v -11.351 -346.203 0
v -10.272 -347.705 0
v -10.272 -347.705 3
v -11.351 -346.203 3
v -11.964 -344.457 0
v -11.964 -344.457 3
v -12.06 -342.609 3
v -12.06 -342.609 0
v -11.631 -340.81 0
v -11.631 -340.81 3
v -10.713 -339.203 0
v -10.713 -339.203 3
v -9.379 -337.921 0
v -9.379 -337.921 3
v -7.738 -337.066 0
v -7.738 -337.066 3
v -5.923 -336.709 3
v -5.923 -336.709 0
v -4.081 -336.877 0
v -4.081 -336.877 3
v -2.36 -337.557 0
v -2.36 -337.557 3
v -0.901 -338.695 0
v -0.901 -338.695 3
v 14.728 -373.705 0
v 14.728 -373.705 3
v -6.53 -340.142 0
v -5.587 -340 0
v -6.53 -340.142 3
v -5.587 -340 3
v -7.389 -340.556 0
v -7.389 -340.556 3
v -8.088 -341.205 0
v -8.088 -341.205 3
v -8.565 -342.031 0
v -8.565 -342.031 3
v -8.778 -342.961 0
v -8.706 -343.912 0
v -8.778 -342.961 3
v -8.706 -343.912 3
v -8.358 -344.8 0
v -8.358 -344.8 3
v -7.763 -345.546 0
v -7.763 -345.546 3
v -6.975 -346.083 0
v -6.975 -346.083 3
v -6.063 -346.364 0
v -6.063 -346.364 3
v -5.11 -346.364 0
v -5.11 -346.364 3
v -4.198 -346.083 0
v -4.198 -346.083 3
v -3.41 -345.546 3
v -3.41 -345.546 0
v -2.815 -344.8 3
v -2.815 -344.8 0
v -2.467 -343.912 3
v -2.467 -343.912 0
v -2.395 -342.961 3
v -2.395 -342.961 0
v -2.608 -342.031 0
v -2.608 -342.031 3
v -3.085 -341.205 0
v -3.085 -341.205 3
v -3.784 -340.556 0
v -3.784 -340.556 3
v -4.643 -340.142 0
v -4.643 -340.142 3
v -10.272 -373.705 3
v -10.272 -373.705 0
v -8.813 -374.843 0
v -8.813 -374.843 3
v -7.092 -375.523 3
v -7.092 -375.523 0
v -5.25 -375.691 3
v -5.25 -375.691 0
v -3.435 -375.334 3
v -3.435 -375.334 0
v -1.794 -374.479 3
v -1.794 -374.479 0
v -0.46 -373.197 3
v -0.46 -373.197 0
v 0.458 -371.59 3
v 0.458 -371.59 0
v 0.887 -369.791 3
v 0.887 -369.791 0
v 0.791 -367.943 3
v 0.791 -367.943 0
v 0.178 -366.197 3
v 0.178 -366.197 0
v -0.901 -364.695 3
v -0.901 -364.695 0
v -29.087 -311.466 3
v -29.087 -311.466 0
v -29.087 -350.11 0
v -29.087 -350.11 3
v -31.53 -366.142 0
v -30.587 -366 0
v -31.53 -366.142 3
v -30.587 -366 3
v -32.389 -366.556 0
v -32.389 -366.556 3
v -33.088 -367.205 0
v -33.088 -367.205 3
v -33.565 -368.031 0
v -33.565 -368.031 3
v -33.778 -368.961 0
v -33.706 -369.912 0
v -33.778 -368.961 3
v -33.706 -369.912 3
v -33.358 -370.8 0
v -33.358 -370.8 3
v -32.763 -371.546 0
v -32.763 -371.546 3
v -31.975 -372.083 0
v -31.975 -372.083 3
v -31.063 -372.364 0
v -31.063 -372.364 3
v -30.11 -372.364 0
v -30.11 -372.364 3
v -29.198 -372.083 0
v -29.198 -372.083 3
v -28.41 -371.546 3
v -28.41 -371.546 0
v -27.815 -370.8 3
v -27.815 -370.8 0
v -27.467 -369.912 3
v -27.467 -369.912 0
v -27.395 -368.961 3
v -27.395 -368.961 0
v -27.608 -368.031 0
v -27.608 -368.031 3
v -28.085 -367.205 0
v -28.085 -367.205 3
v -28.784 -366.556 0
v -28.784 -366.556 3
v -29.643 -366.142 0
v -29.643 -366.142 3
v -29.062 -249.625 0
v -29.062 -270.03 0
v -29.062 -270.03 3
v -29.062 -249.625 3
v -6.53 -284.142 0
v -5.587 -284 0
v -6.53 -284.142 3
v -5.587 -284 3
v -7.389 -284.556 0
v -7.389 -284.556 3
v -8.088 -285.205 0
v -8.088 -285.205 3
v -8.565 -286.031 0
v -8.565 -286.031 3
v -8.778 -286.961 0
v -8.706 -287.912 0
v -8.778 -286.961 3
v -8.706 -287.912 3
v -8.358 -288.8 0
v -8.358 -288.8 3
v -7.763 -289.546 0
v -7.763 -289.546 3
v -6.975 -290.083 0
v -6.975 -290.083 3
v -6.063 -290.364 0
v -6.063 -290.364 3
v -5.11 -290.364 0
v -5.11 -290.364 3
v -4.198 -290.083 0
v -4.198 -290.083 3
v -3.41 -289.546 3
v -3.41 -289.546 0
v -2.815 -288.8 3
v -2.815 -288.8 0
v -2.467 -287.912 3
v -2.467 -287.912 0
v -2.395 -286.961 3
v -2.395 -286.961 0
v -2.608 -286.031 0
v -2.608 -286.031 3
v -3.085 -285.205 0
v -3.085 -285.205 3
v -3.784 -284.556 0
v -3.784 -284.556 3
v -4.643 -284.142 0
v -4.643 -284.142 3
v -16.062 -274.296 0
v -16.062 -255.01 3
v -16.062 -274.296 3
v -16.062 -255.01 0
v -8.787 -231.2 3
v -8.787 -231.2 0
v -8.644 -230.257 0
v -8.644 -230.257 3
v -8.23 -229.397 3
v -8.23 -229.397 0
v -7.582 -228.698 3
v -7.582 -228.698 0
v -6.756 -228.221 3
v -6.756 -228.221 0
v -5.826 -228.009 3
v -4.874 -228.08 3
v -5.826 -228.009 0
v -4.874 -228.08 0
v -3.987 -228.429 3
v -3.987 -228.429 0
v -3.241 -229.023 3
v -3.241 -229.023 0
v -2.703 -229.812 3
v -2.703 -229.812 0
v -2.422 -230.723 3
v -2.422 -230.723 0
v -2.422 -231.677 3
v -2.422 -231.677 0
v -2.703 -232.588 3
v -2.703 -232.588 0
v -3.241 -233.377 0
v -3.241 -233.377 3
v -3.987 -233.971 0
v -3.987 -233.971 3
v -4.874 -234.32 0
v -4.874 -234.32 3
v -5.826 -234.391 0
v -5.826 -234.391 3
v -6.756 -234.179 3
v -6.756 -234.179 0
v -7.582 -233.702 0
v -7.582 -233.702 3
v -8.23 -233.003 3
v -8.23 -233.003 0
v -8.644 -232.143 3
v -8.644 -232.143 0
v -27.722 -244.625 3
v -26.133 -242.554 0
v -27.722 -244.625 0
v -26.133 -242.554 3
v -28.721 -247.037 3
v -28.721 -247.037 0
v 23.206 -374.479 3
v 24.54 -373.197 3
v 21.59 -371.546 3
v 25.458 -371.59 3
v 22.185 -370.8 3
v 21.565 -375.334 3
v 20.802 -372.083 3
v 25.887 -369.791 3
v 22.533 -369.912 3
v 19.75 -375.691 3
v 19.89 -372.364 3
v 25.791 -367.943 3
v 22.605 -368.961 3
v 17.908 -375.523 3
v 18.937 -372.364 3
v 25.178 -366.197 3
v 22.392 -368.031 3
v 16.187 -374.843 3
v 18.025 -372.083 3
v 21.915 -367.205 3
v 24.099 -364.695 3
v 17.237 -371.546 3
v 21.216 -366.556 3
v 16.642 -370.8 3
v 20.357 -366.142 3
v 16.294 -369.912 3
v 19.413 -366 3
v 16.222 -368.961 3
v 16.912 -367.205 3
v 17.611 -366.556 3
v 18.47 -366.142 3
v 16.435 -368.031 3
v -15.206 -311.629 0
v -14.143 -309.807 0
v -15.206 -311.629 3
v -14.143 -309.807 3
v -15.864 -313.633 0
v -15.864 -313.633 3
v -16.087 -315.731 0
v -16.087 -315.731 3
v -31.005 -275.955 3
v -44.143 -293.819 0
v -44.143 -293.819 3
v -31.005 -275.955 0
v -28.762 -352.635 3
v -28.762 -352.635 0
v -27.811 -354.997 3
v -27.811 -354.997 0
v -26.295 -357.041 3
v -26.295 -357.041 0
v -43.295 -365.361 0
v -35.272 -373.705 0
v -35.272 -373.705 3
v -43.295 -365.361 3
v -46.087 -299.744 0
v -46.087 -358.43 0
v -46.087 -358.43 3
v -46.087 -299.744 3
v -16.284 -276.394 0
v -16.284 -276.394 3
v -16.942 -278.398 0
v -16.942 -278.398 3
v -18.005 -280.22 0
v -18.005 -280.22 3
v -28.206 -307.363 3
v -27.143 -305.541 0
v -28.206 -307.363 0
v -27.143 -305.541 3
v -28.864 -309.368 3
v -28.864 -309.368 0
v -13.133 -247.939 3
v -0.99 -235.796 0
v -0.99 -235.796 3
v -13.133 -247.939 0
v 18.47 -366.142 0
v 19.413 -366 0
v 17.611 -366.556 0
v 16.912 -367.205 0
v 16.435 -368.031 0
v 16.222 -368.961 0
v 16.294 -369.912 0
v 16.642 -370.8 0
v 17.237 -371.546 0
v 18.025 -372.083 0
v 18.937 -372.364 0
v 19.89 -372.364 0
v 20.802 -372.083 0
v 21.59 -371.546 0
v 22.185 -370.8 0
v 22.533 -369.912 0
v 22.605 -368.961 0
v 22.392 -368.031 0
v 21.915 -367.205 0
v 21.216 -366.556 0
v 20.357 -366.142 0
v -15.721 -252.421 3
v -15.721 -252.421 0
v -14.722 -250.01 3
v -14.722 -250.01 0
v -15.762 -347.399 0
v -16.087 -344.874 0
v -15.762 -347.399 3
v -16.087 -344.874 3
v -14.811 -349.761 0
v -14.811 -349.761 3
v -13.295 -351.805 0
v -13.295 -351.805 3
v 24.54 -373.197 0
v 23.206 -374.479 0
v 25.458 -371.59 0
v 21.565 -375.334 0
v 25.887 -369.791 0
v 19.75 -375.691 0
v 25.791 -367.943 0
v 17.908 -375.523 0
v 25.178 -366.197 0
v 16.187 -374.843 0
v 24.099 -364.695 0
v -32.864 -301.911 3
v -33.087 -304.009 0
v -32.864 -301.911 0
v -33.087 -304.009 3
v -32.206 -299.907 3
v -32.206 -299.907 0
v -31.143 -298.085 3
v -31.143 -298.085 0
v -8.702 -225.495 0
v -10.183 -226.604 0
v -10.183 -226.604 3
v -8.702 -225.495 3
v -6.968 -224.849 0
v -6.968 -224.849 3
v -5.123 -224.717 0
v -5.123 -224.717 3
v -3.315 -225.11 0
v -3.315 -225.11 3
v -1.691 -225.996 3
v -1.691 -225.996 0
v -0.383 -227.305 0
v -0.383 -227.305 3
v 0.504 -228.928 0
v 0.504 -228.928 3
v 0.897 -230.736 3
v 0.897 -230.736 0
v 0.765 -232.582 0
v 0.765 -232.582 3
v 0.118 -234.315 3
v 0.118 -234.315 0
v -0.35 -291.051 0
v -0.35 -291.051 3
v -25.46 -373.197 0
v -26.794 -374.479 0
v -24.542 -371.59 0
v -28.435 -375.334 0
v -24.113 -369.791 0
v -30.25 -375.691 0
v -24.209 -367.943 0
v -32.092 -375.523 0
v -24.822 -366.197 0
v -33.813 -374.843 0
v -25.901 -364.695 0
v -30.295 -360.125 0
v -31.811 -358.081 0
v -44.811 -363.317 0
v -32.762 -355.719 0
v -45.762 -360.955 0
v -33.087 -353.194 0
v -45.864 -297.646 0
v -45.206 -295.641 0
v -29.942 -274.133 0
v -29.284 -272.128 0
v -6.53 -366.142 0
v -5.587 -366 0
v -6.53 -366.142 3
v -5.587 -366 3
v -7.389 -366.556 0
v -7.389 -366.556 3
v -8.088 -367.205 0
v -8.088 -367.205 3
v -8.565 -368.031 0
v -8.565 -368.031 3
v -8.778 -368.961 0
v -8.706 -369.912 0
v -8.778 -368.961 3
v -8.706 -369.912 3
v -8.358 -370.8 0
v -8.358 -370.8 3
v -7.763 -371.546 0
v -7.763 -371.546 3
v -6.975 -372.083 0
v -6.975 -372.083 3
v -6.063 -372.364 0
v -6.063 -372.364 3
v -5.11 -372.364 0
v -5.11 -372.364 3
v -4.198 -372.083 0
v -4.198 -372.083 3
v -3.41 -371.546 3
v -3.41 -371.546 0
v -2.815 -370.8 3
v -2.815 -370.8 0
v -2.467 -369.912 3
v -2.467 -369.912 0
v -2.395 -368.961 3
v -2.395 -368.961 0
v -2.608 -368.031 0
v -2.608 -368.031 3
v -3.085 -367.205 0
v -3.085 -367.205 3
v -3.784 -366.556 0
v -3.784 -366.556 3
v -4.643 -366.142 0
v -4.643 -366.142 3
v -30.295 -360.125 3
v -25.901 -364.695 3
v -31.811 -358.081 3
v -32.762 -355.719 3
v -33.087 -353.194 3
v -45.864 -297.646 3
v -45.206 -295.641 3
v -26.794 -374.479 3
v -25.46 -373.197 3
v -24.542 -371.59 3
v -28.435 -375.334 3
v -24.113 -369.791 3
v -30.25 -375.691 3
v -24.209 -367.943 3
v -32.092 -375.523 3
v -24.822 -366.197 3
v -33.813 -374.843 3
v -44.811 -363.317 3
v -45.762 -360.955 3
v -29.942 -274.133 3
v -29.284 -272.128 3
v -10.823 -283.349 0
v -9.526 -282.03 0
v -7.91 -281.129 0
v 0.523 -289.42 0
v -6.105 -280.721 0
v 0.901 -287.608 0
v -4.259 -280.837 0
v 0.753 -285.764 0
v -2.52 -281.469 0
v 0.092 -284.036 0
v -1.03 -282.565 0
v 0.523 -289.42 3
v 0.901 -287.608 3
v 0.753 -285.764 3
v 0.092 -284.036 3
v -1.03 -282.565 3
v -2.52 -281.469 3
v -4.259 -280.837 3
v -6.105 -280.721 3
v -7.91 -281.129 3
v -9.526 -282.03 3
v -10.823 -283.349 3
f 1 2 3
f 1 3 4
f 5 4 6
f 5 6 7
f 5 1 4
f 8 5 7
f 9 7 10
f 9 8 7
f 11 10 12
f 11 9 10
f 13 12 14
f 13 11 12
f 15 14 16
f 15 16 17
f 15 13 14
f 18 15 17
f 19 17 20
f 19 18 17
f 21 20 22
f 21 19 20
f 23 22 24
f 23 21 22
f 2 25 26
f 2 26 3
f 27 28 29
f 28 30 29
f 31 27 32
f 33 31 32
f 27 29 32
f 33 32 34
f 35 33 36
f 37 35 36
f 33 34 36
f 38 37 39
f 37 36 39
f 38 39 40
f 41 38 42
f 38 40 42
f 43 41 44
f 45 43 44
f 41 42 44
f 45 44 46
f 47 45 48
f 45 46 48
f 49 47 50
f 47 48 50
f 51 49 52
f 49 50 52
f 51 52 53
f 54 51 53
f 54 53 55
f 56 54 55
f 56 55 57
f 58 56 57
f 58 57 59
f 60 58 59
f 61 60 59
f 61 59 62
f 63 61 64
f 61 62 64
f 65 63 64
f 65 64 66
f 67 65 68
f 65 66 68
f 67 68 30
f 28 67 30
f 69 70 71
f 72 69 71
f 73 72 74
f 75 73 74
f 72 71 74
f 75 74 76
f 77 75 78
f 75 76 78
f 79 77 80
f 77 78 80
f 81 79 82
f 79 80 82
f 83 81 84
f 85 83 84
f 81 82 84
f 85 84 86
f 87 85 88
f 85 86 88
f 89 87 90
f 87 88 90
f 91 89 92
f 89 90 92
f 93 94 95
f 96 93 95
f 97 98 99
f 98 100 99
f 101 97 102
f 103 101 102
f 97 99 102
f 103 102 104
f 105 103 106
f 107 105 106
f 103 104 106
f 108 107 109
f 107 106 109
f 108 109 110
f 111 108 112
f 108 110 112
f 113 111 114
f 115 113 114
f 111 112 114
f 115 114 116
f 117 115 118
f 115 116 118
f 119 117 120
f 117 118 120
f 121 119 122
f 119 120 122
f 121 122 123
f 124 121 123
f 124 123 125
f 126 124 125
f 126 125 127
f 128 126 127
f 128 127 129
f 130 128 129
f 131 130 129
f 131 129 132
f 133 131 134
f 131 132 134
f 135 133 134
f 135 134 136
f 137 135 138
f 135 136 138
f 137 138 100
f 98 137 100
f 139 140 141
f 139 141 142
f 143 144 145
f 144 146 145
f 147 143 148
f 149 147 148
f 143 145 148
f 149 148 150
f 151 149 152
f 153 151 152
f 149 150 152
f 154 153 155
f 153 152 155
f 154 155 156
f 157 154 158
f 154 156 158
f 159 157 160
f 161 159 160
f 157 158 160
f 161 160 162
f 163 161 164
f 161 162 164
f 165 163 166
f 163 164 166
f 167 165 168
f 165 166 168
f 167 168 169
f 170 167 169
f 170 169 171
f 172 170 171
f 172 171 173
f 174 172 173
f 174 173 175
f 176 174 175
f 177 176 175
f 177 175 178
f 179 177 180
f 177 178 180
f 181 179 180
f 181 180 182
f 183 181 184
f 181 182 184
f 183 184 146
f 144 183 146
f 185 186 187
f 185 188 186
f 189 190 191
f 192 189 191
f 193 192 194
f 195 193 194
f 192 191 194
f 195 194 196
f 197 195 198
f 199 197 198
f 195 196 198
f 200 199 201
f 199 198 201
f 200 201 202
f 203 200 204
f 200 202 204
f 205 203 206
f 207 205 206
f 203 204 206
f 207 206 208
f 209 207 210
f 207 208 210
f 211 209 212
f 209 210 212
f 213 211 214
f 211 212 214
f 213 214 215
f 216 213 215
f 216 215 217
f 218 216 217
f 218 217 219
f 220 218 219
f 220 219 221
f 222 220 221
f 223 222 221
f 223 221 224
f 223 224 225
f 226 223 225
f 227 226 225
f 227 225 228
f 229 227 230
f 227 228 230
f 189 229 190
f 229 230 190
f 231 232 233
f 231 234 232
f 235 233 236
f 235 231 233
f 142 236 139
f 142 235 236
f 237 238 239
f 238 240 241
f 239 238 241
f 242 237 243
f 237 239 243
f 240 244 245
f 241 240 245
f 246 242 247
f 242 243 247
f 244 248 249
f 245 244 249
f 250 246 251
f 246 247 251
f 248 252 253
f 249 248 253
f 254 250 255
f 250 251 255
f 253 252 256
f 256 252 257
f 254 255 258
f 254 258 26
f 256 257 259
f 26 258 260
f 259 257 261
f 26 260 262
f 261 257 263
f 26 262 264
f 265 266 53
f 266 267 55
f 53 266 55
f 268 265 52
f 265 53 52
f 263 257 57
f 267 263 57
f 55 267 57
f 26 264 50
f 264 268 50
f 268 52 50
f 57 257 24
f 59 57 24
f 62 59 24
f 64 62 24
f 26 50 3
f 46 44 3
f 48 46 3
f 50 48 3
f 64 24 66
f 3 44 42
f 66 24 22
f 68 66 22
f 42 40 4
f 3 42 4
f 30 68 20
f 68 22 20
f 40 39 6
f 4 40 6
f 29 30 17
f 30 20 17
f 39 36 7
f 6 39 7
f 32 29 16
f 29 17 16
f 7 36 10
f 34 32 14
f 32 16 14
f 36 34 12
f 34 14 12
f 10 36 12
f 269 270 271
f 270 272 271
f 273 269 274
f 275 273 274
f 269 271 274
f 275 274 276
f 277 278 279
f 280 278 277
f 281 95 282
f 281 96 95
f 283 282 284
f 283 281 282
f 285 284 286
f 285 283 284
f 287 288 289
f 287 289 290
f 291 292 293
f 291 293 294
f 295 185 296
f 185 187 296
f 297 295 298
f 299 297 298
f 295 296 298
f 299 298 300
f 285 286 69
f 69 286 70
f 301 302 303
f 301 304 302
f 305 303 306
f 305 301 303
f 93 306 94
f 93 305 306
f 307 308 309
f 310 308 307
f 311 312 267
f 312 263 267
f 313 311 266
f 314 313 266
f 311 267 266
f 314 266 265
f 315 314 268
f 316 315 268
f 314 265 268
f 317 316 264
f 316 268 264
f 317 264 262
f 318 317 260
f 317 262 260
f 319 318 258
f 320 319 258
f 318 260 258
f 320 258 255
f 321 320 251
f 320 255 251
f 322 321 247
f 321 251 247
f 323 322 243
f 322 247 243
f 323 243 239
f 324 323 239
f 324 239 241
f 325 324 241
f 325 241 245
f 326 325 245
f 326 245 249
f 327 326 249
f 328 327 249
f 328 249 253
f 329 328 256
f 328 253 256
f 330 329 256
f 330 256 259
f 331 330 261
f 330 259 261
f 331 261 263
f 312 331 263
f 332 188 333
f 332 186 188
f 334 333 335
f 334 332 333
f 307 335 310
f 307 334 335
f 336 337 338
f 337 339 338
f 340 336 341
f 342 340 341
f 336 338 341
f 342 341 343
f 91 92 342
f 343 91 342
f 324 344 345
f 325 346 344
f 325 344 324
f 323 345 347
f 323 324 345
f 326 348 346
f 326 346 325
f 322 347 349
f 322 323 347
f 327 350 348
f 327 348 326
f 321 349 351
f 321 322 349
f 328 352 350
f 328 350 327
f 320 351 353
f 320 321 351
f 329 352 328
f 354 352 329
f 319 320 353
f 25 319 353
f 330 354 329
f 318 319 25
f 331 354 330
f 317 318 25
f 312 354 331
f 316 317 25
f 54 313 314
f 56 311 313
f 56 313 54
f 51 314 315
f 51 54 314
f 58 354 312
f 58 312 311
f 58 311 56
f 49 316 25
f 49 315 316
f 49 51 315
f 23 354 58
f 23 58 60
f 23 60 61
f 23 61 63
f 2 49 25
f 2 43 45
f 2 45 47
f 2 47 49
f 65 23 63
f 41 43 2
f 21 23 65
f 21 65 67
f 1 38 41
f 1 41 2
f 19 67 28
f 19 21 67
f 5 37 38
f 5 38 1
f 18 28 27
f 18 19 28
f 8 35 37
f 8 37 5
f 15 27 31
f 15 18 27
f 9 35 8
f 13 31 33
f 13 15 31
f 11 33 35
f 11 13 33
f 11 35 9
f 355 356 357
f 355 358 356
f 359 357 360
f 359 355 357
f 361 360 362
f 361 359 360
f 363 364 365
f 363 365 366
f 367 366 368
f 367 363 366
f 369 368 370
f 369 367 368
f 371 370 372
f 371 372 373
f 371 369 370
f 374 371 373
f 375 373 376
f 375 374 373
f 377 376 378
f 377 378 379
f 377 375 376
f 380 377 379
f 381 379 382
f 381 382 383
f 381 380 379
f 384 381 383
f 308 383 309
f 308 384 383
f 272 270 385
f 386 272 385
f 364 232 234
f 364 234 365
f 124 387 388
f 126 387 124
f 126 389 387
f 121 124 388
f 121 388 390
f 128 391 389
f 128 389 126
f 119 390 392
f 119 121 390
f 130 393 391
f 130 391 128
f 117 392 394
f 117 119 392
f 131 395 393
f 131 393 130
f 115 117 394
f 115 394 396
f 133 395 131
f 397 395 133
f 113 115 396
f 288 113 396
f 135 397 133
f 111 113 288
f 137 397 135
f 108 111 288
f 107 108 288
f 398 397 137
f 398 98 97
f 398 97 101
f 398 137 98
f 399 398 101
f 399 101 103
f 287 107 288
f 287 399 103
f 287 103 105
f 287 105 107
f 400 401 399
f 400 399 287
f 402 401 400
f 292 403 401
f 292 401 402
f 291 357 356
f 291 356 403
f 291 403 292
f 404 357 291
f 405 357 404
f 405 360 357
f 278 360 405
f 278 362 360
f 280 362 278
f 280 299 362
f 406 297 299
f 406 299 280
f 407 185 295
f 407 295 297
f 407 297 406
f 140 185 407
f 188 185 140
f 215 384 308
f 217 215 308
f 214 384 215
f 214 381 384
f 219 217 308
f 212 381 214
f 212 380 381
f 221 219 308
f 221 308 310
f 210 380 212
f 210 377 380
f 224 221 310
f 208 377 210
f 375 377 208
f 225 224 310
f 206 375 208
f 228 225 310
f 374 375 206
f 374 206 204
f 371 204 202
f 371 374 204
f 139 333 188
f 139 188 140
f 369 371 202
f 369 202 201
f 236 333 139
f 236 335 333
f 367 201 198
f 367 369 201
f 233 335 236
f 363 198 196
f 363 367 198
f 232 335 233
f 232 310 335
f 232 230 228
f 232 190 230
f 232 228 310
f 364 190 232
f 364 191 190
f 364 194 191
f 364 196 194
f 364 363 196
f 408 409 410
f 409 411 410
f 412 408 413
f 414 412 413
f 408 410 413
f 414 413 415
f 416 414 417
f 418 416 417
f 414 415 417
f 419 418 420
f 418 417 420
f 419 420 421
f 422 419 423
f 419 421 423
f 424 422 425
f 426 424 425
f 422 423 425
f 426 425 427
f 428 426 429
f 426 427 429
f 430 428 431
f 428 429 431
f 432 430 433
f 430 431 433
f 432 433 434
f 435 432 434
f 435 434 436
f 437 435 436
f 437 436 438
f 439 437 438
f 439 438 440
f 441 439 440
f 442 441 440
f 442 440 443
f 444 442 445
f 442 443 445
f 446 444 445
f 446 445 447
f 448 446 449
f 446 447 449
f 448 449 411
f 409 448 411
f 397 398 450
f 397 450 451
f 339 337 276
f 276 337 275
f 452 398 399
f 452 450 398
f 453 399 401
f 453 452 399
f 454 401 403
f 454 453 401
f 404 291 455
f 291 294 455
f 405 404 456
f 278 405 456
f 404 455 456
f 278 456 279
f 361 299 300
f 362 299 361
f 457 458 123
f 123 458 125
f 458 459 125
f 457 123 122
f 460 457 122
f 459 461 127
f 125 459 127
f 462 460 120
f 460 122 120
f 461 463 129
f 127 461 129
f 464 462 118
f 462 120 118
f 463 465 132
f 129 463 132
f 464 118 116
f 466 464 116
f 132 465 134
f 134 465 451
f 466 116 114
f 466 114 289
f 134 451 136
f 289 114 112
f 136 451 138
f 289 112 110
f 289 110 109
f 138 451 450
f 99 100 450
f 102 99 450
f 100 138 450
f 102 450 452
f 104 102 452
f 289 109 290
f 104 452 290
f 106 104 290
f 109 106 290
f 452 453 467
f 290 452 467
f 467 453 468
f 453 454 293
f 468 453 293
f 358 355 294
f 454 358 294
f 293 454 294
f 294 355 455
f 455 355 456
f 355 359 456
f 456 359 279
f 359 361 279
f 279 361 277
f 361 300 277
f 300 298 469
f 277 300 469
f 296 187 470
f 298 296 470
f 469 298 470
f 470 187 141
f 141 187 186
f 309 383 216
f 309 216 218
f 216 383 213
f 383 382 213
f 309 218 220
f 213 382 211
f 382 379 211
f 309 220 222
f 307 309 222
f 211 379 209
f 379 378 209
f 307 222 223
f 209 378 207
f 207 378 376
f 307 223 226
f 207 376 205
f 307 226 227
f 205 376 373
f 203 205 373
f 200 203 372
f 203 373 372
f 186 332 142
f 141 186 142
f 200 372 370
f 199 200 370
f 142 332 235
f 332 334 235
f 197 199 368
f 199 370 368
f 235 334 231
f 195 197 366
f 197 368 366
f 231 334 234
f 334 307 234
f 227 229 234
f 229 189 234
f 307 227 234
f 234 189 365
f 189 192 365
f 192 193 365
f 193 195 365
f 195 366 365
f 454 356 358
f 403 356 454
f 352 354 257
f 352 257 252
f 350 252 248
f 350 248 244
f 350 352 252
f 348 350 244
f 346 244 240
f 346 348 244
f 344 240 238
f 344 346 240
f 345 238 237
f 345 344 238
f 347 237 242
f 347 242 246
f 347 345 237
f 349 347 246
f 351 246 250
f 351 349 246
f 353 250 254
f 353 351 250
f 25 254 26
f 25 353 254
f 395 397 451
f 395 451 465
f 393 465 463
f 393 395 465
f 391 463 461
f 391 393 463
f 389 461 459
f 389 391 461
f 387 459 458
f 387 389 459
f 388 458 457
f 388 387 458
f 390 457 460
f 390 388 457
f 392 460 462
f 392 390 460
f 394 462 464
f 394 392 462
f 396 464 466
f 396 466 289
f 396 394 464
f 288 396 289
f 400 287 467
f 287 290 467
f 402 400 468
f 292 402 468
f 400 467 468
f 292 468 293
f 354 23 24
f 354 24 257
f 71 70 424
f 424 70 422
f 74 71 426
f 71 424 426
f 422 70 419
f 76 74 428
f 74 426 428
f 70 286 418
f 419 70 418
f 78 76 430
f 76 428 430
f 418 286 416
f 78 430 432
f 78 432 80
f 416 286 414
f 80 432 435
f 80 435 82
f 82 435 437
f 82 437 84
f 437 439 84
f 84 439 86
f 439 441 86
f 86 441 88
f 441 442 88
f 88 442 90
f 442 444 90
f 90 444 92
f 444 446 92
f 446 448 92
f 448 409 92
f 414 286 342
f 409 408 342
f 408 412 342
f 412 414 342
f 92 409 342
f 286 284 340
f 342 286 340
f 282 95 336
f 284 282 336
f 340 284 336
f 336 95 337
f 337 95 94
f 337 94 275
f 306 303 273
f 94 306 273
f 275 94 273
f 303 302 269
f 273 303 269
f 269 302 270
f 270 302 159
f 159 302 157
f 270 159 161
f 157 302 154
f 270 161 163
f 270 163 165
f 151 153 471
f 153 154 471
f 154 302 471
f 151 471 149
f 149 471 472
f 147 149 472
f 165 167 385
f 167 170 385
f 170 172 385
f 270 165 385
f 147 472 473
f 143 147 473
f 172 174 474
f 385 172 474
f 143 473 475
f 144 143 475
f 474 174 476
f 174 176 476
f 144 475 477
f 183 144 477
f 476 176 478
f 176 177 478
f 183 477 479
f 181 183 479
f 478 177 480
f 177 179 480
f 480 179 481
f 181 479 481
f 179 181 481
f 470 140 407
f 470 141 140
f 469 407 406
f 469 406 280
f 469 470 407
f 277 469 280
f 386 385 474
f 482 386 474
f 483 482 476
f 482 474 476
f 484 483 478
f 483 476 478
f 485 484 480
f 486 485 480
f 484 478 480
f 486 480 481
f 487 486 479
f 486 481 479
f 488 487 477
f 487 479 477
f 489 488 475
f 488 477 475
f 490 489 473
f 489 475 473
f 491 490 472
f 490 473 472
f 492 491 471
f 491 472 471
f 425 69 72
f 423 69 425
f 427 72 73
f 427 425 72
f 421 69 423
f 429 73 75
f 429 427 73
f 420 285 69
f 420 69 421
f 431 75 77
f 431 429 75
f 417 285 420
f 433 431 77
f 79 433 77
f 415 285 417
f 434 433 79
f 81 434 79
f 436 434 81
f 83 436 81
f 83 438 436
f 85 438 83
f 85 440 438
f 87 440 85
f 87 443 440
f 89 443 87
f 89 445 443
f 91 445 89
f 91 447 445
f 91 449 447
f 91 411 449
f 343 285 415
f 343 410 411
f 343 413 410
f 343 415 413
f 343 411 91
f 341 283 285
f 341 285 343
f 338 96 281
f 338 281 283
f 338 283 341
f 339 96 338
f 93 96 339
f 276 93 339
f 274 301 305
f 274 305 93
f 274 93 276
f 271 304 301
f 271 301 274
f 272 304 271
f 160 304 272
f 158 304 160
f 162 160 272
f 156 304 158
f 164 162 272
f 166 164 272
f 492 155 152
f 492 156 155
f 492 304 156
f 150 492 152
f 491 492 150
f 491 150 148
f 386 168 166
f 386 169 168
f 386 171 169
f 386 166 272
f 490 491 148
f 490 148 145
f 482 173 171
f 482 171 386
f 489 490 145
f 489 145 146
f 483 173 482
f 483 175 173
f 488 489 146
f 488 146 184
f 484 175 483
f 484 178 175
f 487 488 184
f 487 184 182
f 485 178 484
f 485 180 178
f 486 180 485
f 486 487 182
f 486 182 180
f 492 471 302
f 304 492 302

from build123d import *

# Parameters (mm, degrees)
EXTRUDE_1_DEPTH             = 3
EXTRUDE_1_2_DEPTH           = 3
EXTRUDE_1_3_DEPTH           = 3
SKETCH_6_W                  = 3.2
SKETCH_6_H                  = 3
HOLE_WIZARD_M6_1_AT_2_COUNT = 2
HOLE_WIZARD_M6_1_AT_2_PITCH = 25
HOLE_WIZARD_M6_1_AT_3_COUNT = 2
HOLE_WIZARD_M6_1_AT_3_PITCH = 50
HOLE_WIZARD_M6_1_AT_4_COUNT = 2
HOLE_WIZARD_M6_1_AT_4_PITCH = 85.726308681
HOLE_WIZARD_M6_1_AT_5_COUNT = 2
HOLE_WIZARD_M6_1_AT_5_PITCH = 36.069377594
HOLE_WIZARD_M6_1_AT_6_COUNT = 2
HOLE_WIZARD_M6_1_AT_6_PITCH = 140.24621207
FILLET_1_R                  = 10
FILLET_2_R                  = 10
SKETCH_7_R                  = 3.2
CUT_EXTRUDE_1_DEPTH         = 10
SKETCH_7_3_R                = 3.2
EXTRUDE_2_DEPTH             = 3
FILLET_3_R                  = 10


with BuildPart() as part:
    # 草图4 → 凸台-拉伸1 (new body)
    with BuildSketch(Plane.XY):
        with BuildLine():
            Line((-33.086531987, -357.221961826), (-25.901117065, -364.694793344))
            ThreePointArc((-25.901117065, -364.694793344), (-26.081325331, -373.885414922), (-35.271946908, -373.705206656))
            Line((-35.271946908, -373.705206656), (-46.086531987, -362.458038174))
            Line((-46.086531987, -362.458038174), (-46.086531987, -296.462680507))
            Line((-46.086531987, -296.462680507), (-12.086531987, -250.228047376))
            Line((-12.086531987, -250.228047376), (-12.086531987, -231.2))
            ThreePointArc((-12.086531987, -231.2), (-5.586531987, -224.7), (0.913468013, -231.2))
            Line((0.913468013, -231.2), (0.913468013, -254.493431981))
            Line((0.913468013, -254.493431981), (-33.086531987, -300.728065112))
            Line((-33.086531987, -300.728065112), (-33.086531987, -357.221961826))
        make_face()
    extrude(amount=EXTRUDE_1_DEPTH)


with BuildPart() as body_2:
    # 草图4 → Extrude 1 2 (new body)
    with BuildSketch(Plane.XY):
        with BuildLine():
            Line((-10.82305025, -283.349171976), (-29.086531987, -308.184624263))
            Line((-29.086531987, -308.184624263), (-29.086531987, -354.138038174))
            Line((-29.086531987, -354.138038174), (-10.271946908, -373.705206656))
            ThreePointArc((-10.271946908, -373.705206656), (-1.081325331, -373.885414922), (-0.901117065, -364.694793344))
            Line((-0.901117065, -364.694793344), (-16.086531987, -348.901961826))
            Line((-16.086531987, -348.901961826), (-16.086531987, -312.450008868))
            Line((-16.086531987, -312.450008868), (-0.350013723, -291.050828024))
            ThreePointArc((-0.350013723, -291.050828024), (-1.735703962, -281.963481736), (-10.82305025, -283.349171976))
        make_face()
    extrude(amount=EXTRUDE_1_2_DEPTH)


with BuildPart() as body_3:
    # 草图4 → Extrude 1 3 (new body)
    with BuildSketch(Plane.XY):
        with BuildLine():
            Line((-0.901117065, -338.694793344), (24.098882935, -364.694793344))
            ThreePointArc((24.098882935, -364.694793344), (23.918674669, -373.885414922), (14.728053092, -373.705206656))
            Line((14.728053092, -373.705206656), (-10.271946908, -347.705206656))
            ThreePointArc((-10.271946908, -347.705206656), (-10.091738642, -338.514585078), (-0.901117065, -338.694793344))
        make_face()
    extrude(amount=EXTRUDE_1_3_DEPTH)

    # 草图6 → M6 间隙孔1 (revolve, cut)
    with BuildSketch(Plane(origin=(19.413468013, -369.2, 0), x_dir=(0, 1, 0), z_dir=(1, 0, 0))):
        with Locations((1.6, 1.5)):
            Rectangle(SKETCH_6_W, SKETCH_6_H)
    hole_wizard_m6_1 = revolve(axis=Axis((19.413468013, -369.2, -6.35), (0, 0, 1)), mode=Mode.SUBTRACT)

    # M6 间隙孔1 at 5: M6 间隙孔1 ×2
    with Locations(*[Vector(-0.693108716, 0.720833065, 0) * (i * HOLE_WIZARD_M6_1_AT_5_PITCH) for i in range(1, HOLE_WIZARD_M6_1_AT_5_COUNT)]):
        add(hole_wizard_m6_1, mode=Mode.SUBTRACT)


with BuildPart() as body_2_1:
    add(body_2.part)

    # M6 间隙孔1 at 2: M6 间隙孔1 ×2
    with Locations(*[(-i * HOLE_WIZARD_M6_1_AT_2_PITCH, 0, 0) for i in range(1, HOLE_WIZARD_M6_1_AT_2_COUNT)]):
        add(hole_wizard_m6_1, mode=Mode.SUBTRACT)

    # M6 间隙孔1 at 4: M6 间隙孔1 ×2
    with Locations(*[Vector(-0.291625761, 0.956532496, 0) * (i * HOLE_WIZARD_M6_1_AT_4_PITCH) for i in range(1, HOLE_WIZARD_M6_1_AT_4_COUNT)]):
        add(hole_wizard_m6_1, mode=Mode.SUBTRACT)

    # 圆角1
    fillet_1_edges = [body_2_1.edges().sort_by_distance(p)[0] for p in [
        (-16.086531987, -312.450008868, 1.5),
        (-16.086531987, -348.901961826, 1.5),
        (-29.086531987, -354.138038174, 1.5),
        (-29.086531987, -308.184624263, 1.5),
    ]]
    fillet(fillet_1_edges, radius=FILLET_1_R)


with BuildPart() as part_1:
    add(part.part)

    # M6 间隙孔1 at 3: M6 间隙孔1 ×2
    with Locations(*[(-i * HOLE_WIZARD_M6_1_AT_3_PITCH, 0, 0) for i in range(1, HOLE_WIZARD_M6_1_AT_3_COUNT)]):
        add(hole_wizard_m6_1, mode=Mode.SUBTRACT)

    # M6 间隙孔1 at 6: M6 间隙孔1 ×2
    with Locations(*[Vector(-0.178257934, 0.983983795, 0) * (i * HOLE_WIZARD_M6_1_AT_6_PITCH) for i in range(1, HOLE_WIZARD_M6_1_AT_6_COUNT)]):
        add(hole_wizard_m6_1, mode=Mode.SUBTRACT)

    # 圆角2
    fillet_2_edges = [part_1.edges().sort_by_distance(p)[0] for p in [
        (-33.086531987, -357.221961826, 1.5),
        (-46.086531987, -362.458038174, 1.5),
        (-46.086531987, -296.462680507, 1.5),
        (-12.086531987, -250.228047376, 1.5),
        (0.913468013, -254.493431981, 1.5),
        (-33.086531987, -300.728065112, 1.5),
    ]]
    fillet(fillet_2_edges, radius=FILLET_2_R)

    # 草图7 → 切除-拉伸1 (cut)
    with BuildSketch(Plane(origin=(0, 0, 0), x_dir=(-1, 0, 0), z_dir=(0, 0, -1))):
        with BuildLine():
            Line((1.030350042, -257.136717707), (16.061662492, -277.576929959))
            Line((16.061662492, -277.576929959), (16.061662492, -255.633597392))
            Line((16.061662492, -255.633597392), (14.030350042, -252.871333102))
            ThreePointArc((14.030350042, -252.871333102), (12.584905298, -250.064527848), (12.086531987, -246.946982295))
            Line((12.086531987, -246.946982295), (12.086531987, -246.892388155))
            Line((12.086531987, -246.892388155), (0.990337909, -235.796194078))
            ThreePointArc((0.990337909, -235.796194078), (-0.418684975, -233.68744231), (-0.913468013, -231.2))
            Line((-0.913468013, -231.2), (-0.913468013, -251.2123669))
            ThreePointArc((-0.913468013, -251.2123669), (-0.415094702, -254.329912453), (1.030350042, -257.136717707))
        make_face()
        with BuildLine():
            Line((0.990337909, -235.796194078), (12.086531987, -246.892388155))
            Line((12.086531987, -246.892388155), (12.086531987, -231.2))
            ThreePointArc((12.086531987, -231.2), (8.073974297, -237.205216961), (0.990337909, -235.796194078))
        make_face()
        with BuildLine():
            ThreePointArc((10.182726064, -226.603805922), (3.099089676, -225.194783039), (-0.913468013, -231.2))
            ThreePointArc((-0.913468013, -231.2), (-0.418684975, -233.68744231), (0.990337909, -235.796194078))
            ThreePointArc((0.990337909, -235.796194078), (8.073974297, -237.205216961), (12.086531987, -231.2))
            ThreePointArc((12.086531987, -231.2), (11.591748948, -228.71255769), (10.182726064, -226.603805922))
        make_face()
        with Locations((5.586531987, -231.2)):
            Circle(SKETCH_7_R, mode=Mode.SUBTRACT)
    extrude(amount=-CUT_EXTRUDE_1_DEPTH, mode=Mode.SUBTRACT)

    # 草图7<3> → 凸台-拉伸2 (add)
    with BuildSketch(Plane(origin=(0, 0, 0), x_dir=(-1, 0, 0), z_dir=(0, 0, -1))):
        with BuildLine():
            Line((16.061662492, -250.867518661), (16.061662492, -255.633597392))
            Line((16.061662492, -255.633597392), (29.061662492, -273.311545354))
            Line((29.061662492, -273.311545354), (29.061662492, -245.48274235))
            Line((29.061662492, -245.48274235), (10.182726064, -226.603805922))
            ThreePointArc((10.182726064, -226.603805922), (0.990337909, -226.603805922), (0.990337909, -235.796194078))
            Line((0.990337909, -235.796194078), (16.061662492, -250.867518661))
        make_face()
        with Locations((5.586531987, -231.2)):
            Circle(SKETCH_7_3_R, mode=Mode.SUBTRACT)
    extrude(amount=-EXTRUDE_2_DEPTH)

    # 圆角3
    fillet_3_edges = [part_1.edges().sort_by_distance(p)[0] for p in [
        (-16.061662492, -250.867518661, 1.5),
        (-29.061662492, -273.311545354, 1.5),
        (-29.061662492, -245.48274235, 1.5),
        (-16.061662492, -277.576929959, 1.5),
    ]]
    fillet(fillet_3_edges, radius=FILLET_3_R)


solid = Compound([body_3.part, body_2_1.part, part_1.part])
